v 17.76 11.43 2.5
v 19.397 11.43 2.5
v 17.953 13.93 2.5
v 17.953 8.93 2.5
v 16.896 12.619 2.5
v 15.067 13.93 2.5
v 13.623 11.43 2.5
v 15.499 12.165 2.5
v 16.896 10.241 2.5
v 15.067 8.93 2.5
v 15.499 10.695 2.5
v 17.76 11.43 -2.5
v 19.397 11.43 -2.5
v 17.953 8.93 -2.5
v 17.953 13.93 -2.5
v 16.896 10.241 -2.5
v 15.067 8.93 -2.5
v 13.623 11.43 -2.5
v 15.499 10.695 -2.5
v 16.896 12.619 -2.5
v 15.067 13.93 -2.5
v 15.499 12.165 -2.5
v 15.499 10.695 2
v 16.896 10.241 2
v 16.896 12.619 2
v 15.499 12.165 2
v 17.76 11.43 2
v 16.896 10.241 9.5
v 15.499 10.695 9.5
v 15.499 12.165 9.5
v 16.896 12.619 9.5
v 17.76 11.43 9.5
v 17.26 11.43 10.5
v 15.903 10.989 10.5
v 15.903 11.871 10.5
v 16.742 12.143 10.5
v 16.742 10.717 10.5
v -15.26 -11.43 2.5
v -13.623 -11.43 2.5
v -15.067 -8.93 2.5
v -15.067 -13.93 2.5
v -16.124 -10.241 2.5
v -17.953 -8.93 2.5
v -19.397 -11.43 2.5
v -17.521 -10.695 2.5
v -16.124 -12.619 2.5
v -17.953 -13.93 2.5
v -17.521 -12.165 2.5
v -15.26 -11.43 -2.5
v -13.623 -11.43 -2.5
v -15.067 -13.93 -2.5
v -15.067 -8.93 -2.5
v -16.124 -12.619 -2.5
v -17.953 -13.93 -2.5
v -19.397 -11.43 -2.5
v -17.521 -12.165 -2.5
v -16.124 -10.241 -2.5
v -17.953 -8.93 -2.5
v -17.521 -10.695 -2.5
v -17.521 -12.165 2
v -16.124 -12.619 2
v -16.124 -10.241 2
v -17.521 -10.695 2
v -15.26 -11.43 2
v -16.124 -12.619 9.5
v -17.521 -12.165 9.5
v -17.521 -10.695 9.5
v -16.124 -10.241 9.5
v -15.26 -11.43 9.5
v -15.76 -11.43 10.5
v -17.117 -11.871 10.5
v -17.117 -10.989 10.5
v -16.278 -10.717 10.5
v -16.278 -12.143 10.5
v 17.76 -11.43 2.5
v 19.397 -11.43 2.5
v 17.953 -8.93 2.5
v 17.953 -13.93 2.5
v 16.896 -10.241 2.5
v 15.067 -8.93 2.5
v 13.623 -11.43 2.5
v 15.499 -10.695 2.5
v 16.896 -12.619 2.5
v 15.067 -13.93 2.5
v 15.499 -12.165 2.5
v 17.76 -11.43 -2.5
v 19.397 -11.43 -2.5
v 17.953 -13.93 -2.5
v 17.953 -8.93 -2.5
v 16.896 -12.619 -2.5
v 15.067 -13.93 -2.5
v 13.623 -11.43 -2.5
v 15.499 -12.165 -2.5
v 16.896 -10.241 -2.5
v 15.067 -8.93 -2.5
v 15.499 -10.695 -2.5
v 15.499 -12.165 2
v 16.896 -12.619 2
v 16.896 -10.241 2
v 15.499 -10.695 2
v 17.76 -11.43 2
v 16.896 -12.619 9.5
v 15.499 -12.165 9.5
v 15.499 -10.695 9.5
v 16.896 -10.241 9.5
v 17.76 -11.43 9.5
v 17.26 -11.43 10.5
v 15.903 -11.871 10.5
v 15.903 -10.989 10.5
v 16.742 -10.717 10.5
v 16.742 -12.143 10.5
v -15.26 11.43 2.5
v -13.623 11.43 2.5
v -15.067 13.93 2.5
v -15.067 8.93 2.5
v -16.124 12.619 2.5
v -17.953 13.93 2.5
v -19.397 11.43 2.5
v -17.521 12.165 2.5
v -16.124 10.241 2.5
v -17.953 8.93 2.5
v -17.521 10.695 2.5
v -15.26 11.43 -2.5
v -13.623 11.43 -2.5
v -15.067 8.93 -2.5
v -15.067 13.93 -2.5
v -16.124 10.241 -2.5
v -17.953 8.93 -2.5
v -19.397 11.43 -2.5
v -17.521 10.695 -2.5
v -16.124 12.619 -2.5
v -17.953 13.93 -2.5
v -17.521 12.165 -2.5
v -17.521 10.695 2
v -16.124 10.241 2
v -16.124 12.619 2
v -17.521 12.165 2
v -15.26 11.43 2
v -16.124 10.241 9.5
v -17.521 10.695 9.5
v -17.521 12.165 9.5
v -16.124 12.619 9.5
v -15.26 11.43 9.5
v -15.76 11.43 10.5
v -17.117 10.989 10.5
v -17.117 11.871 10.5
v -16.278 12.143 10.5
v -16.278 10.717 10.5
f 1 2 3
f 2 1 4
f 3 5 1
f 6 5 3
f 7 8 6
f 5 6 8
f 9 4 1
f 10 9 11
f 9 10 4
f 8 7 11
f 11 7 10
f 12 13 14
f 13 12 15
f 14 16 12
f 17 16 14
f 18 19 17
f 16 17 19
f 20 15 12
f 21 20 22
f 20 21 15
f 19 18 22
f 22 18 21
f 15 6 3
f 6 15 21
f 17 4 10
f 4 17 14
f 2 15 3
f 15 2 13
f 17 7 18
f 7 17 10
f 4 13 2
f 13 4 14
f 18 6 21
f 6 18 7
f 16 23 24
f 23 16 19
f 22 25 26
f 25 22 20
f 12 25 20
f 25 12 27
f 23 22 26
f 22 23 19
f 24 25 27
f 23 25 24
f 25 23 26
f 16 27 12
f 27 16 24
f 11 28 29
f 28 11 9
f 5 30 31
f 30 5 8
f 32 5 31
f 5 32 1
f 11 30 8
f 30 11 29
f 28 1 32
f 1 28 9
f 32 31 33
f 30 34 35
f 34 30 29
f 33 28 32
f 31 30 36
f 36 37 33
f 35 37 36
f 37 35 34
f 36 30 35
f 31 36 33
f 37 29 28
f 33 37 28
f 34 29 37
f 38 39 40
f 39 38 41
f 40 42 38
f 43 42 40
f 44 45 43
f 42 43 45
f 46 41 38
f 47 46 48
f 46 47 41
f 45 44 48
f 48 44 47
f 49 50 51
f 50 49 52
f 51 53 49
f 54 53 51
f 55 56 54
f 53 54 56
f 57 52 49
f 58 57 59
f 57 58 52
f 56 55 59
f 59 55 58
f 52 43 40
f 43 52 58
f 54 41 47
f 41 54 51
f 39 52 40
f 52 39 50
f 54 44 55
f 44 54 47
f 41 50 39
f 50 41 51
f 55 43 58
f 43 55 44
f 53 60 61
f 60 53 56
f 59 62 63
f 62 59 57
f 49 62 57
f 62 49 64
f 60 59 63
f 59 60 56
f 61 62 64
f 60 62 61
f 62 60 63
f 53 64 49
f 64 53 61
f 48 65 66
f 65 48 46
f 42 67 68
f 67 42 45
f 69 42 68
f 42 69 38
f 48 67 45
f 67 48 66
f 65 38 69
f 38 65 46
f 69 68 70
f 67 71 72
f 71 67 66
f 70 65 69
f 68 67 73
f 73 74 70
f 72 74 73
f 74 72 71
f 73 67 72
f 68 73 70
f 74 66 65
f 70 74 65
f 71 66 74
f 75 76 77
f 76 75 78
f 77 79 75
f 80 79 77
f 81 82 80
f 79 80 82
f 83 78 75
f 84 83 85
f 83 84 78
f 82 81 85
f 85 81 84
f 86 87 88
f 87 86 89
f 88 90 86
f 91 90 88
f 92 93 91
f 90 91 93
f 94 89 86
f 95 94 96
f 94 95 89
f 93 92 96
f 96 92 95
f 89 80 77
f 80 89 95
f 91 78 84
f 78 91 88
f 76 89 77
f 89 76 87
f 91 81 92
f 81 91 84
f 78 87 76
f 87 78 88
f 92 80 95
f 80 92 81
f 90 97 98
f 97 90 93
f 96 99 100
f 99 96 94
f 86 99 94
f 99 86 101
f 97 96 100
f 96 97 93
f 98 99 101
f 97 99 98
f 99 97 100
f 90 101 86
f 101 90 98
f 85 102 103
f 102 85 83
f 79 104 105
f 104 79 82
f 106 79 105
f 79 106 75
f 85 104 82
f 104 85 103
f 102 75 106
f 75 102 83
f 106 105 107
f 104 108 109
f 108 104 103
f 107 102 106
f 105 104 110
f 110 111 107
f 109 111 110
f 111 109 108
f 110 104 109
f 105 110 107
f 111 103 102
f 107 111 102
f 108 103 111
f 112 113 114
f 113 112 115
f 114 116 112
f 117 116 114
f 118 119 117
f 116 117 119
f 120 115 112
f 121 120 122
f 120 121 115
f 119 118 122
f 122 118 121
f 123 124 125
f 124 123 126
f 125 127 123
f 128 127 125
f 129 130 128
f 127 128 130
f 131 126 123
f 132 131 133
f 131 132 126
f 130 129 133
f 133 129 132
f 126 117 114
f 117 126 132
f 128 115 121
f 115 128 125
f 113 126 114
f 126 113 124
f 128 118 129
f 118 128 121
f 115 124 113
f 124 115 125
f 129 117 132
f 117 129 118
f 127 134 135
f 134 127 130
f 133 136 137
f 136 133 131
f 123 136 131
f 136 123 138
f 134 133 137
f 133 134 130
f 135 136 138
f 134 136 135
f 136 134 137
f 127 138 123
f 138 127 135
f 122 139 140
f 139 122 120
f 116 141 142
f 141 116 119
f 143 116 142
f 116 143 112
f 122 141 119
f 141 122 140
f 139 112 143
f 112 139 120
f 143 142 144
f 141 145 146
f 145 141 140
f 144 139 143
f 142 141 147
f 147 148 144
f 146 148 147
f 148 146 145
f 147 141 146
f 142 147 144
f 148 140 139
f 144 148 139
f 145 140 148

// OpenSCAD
// file: dim1.scad
//L'objet de ce fichier est de consigner les dimensions et les contraintes communes aux trois pieces de la e-poignee.
//Ces trois pieces sont fabriquees sur imprimante 3D, elles sont completees d'un Circuit Imprime (CI) et d'un isolateur.
//Le montage de l'ensemble est realise à l'aide d'un jeu de visserie compose
//de vis, de rondelles, d'un ecrou autobloquant et d'entretoises filetees.
//Les noms attribues a ces trois pieces sont la jupe, le top et le logo.
//Les dimensions relatives au CI sont exprimees en pouces et converties en mm à l'aide d'un Coefficient de Conversion (CC).
CC=25.4;//Coefficient de Conversion (pouce -> mm)
L1=1.6*CC;//longueur du CI
L2=1.3*CC;//entre axes des trous de fixation du CI
l1=1.2*CC;//largeur du CI
l2=0.9*CC;//entre axes des trous de fixation du CI
r=(0.125*CC)/2;//rayon de percage des trous de fixation du CI
e=0.1*CC;//epaisseur des parois
R=37.15;//Rayon du cercle de revolution du tore
//La premiere contrainte commune au logo et au top est la visibilite de l'embase USB.
//Cette visibilite est necessaire quand l'utilisateur etablit la connection du cable sur l'embase USB.
//La seconde contrainte est thermique, la temperature du couvercle peut atteindre des valeurs aux environ des 90°C.
//L'experience a montree que la matiere (PLA ou ABS) ramolie a ces temperatures.
//Cette contrainte est prise en compte par l'insertion de l'isolateur, elle concerne egalement la perimetre inferieur de la jupe.
// main file
//$fn=100;
include<dim1.scad>
//Module Entretoise
module ent_M(M,l1_e,l2_e, x, xt, yt)
//M comme métrique (diamètre de la partie filetée)
//l1_e est la longueur de la partie hexagonale femelle
//l2_e est la longueur de la partie male
//x est le quotient du rayon r par la tangente 60°
{r=x/tan(60);
translate([xt,yt,0]){
difference(){
union(){
rotate([0,0,0])cube(size = [r,x,l1_e], center = true);
rotate([0,0,-60])cube(size = [r,x,l1_e], center = true);
rotate([0,0,-120])cube(size = [r,x,l1_e], center = true);
}//union
translate([0,0,-l2_e/4])cylinder(h = l2_e, r1 = M/2, r2 = M/2, center = true);//filetage femelle
}//difference
translate([0,0,((l1_e/2)+(l2_e/2))-0.5])cylinder(h = l2_e-1, r1 = M/2, r2 = M/2, center = true);
translate([0,0,((l1_e/2)+(l2_e))-0.5])cylinder(h = 1, r1 = M/2, r2 = (M/2)-0.5, center = true);
}//translate
}//module
ent_M(2.5,5,8,5,L2/2,l2/2);
ent_M(2.5,5,8,5,-L2/2,-l2/2);
ent_M(2.5,5,8,5,L2/2,-l2/2);
ent_M(2.5,5,8,5,-L2/2,l2/2);
